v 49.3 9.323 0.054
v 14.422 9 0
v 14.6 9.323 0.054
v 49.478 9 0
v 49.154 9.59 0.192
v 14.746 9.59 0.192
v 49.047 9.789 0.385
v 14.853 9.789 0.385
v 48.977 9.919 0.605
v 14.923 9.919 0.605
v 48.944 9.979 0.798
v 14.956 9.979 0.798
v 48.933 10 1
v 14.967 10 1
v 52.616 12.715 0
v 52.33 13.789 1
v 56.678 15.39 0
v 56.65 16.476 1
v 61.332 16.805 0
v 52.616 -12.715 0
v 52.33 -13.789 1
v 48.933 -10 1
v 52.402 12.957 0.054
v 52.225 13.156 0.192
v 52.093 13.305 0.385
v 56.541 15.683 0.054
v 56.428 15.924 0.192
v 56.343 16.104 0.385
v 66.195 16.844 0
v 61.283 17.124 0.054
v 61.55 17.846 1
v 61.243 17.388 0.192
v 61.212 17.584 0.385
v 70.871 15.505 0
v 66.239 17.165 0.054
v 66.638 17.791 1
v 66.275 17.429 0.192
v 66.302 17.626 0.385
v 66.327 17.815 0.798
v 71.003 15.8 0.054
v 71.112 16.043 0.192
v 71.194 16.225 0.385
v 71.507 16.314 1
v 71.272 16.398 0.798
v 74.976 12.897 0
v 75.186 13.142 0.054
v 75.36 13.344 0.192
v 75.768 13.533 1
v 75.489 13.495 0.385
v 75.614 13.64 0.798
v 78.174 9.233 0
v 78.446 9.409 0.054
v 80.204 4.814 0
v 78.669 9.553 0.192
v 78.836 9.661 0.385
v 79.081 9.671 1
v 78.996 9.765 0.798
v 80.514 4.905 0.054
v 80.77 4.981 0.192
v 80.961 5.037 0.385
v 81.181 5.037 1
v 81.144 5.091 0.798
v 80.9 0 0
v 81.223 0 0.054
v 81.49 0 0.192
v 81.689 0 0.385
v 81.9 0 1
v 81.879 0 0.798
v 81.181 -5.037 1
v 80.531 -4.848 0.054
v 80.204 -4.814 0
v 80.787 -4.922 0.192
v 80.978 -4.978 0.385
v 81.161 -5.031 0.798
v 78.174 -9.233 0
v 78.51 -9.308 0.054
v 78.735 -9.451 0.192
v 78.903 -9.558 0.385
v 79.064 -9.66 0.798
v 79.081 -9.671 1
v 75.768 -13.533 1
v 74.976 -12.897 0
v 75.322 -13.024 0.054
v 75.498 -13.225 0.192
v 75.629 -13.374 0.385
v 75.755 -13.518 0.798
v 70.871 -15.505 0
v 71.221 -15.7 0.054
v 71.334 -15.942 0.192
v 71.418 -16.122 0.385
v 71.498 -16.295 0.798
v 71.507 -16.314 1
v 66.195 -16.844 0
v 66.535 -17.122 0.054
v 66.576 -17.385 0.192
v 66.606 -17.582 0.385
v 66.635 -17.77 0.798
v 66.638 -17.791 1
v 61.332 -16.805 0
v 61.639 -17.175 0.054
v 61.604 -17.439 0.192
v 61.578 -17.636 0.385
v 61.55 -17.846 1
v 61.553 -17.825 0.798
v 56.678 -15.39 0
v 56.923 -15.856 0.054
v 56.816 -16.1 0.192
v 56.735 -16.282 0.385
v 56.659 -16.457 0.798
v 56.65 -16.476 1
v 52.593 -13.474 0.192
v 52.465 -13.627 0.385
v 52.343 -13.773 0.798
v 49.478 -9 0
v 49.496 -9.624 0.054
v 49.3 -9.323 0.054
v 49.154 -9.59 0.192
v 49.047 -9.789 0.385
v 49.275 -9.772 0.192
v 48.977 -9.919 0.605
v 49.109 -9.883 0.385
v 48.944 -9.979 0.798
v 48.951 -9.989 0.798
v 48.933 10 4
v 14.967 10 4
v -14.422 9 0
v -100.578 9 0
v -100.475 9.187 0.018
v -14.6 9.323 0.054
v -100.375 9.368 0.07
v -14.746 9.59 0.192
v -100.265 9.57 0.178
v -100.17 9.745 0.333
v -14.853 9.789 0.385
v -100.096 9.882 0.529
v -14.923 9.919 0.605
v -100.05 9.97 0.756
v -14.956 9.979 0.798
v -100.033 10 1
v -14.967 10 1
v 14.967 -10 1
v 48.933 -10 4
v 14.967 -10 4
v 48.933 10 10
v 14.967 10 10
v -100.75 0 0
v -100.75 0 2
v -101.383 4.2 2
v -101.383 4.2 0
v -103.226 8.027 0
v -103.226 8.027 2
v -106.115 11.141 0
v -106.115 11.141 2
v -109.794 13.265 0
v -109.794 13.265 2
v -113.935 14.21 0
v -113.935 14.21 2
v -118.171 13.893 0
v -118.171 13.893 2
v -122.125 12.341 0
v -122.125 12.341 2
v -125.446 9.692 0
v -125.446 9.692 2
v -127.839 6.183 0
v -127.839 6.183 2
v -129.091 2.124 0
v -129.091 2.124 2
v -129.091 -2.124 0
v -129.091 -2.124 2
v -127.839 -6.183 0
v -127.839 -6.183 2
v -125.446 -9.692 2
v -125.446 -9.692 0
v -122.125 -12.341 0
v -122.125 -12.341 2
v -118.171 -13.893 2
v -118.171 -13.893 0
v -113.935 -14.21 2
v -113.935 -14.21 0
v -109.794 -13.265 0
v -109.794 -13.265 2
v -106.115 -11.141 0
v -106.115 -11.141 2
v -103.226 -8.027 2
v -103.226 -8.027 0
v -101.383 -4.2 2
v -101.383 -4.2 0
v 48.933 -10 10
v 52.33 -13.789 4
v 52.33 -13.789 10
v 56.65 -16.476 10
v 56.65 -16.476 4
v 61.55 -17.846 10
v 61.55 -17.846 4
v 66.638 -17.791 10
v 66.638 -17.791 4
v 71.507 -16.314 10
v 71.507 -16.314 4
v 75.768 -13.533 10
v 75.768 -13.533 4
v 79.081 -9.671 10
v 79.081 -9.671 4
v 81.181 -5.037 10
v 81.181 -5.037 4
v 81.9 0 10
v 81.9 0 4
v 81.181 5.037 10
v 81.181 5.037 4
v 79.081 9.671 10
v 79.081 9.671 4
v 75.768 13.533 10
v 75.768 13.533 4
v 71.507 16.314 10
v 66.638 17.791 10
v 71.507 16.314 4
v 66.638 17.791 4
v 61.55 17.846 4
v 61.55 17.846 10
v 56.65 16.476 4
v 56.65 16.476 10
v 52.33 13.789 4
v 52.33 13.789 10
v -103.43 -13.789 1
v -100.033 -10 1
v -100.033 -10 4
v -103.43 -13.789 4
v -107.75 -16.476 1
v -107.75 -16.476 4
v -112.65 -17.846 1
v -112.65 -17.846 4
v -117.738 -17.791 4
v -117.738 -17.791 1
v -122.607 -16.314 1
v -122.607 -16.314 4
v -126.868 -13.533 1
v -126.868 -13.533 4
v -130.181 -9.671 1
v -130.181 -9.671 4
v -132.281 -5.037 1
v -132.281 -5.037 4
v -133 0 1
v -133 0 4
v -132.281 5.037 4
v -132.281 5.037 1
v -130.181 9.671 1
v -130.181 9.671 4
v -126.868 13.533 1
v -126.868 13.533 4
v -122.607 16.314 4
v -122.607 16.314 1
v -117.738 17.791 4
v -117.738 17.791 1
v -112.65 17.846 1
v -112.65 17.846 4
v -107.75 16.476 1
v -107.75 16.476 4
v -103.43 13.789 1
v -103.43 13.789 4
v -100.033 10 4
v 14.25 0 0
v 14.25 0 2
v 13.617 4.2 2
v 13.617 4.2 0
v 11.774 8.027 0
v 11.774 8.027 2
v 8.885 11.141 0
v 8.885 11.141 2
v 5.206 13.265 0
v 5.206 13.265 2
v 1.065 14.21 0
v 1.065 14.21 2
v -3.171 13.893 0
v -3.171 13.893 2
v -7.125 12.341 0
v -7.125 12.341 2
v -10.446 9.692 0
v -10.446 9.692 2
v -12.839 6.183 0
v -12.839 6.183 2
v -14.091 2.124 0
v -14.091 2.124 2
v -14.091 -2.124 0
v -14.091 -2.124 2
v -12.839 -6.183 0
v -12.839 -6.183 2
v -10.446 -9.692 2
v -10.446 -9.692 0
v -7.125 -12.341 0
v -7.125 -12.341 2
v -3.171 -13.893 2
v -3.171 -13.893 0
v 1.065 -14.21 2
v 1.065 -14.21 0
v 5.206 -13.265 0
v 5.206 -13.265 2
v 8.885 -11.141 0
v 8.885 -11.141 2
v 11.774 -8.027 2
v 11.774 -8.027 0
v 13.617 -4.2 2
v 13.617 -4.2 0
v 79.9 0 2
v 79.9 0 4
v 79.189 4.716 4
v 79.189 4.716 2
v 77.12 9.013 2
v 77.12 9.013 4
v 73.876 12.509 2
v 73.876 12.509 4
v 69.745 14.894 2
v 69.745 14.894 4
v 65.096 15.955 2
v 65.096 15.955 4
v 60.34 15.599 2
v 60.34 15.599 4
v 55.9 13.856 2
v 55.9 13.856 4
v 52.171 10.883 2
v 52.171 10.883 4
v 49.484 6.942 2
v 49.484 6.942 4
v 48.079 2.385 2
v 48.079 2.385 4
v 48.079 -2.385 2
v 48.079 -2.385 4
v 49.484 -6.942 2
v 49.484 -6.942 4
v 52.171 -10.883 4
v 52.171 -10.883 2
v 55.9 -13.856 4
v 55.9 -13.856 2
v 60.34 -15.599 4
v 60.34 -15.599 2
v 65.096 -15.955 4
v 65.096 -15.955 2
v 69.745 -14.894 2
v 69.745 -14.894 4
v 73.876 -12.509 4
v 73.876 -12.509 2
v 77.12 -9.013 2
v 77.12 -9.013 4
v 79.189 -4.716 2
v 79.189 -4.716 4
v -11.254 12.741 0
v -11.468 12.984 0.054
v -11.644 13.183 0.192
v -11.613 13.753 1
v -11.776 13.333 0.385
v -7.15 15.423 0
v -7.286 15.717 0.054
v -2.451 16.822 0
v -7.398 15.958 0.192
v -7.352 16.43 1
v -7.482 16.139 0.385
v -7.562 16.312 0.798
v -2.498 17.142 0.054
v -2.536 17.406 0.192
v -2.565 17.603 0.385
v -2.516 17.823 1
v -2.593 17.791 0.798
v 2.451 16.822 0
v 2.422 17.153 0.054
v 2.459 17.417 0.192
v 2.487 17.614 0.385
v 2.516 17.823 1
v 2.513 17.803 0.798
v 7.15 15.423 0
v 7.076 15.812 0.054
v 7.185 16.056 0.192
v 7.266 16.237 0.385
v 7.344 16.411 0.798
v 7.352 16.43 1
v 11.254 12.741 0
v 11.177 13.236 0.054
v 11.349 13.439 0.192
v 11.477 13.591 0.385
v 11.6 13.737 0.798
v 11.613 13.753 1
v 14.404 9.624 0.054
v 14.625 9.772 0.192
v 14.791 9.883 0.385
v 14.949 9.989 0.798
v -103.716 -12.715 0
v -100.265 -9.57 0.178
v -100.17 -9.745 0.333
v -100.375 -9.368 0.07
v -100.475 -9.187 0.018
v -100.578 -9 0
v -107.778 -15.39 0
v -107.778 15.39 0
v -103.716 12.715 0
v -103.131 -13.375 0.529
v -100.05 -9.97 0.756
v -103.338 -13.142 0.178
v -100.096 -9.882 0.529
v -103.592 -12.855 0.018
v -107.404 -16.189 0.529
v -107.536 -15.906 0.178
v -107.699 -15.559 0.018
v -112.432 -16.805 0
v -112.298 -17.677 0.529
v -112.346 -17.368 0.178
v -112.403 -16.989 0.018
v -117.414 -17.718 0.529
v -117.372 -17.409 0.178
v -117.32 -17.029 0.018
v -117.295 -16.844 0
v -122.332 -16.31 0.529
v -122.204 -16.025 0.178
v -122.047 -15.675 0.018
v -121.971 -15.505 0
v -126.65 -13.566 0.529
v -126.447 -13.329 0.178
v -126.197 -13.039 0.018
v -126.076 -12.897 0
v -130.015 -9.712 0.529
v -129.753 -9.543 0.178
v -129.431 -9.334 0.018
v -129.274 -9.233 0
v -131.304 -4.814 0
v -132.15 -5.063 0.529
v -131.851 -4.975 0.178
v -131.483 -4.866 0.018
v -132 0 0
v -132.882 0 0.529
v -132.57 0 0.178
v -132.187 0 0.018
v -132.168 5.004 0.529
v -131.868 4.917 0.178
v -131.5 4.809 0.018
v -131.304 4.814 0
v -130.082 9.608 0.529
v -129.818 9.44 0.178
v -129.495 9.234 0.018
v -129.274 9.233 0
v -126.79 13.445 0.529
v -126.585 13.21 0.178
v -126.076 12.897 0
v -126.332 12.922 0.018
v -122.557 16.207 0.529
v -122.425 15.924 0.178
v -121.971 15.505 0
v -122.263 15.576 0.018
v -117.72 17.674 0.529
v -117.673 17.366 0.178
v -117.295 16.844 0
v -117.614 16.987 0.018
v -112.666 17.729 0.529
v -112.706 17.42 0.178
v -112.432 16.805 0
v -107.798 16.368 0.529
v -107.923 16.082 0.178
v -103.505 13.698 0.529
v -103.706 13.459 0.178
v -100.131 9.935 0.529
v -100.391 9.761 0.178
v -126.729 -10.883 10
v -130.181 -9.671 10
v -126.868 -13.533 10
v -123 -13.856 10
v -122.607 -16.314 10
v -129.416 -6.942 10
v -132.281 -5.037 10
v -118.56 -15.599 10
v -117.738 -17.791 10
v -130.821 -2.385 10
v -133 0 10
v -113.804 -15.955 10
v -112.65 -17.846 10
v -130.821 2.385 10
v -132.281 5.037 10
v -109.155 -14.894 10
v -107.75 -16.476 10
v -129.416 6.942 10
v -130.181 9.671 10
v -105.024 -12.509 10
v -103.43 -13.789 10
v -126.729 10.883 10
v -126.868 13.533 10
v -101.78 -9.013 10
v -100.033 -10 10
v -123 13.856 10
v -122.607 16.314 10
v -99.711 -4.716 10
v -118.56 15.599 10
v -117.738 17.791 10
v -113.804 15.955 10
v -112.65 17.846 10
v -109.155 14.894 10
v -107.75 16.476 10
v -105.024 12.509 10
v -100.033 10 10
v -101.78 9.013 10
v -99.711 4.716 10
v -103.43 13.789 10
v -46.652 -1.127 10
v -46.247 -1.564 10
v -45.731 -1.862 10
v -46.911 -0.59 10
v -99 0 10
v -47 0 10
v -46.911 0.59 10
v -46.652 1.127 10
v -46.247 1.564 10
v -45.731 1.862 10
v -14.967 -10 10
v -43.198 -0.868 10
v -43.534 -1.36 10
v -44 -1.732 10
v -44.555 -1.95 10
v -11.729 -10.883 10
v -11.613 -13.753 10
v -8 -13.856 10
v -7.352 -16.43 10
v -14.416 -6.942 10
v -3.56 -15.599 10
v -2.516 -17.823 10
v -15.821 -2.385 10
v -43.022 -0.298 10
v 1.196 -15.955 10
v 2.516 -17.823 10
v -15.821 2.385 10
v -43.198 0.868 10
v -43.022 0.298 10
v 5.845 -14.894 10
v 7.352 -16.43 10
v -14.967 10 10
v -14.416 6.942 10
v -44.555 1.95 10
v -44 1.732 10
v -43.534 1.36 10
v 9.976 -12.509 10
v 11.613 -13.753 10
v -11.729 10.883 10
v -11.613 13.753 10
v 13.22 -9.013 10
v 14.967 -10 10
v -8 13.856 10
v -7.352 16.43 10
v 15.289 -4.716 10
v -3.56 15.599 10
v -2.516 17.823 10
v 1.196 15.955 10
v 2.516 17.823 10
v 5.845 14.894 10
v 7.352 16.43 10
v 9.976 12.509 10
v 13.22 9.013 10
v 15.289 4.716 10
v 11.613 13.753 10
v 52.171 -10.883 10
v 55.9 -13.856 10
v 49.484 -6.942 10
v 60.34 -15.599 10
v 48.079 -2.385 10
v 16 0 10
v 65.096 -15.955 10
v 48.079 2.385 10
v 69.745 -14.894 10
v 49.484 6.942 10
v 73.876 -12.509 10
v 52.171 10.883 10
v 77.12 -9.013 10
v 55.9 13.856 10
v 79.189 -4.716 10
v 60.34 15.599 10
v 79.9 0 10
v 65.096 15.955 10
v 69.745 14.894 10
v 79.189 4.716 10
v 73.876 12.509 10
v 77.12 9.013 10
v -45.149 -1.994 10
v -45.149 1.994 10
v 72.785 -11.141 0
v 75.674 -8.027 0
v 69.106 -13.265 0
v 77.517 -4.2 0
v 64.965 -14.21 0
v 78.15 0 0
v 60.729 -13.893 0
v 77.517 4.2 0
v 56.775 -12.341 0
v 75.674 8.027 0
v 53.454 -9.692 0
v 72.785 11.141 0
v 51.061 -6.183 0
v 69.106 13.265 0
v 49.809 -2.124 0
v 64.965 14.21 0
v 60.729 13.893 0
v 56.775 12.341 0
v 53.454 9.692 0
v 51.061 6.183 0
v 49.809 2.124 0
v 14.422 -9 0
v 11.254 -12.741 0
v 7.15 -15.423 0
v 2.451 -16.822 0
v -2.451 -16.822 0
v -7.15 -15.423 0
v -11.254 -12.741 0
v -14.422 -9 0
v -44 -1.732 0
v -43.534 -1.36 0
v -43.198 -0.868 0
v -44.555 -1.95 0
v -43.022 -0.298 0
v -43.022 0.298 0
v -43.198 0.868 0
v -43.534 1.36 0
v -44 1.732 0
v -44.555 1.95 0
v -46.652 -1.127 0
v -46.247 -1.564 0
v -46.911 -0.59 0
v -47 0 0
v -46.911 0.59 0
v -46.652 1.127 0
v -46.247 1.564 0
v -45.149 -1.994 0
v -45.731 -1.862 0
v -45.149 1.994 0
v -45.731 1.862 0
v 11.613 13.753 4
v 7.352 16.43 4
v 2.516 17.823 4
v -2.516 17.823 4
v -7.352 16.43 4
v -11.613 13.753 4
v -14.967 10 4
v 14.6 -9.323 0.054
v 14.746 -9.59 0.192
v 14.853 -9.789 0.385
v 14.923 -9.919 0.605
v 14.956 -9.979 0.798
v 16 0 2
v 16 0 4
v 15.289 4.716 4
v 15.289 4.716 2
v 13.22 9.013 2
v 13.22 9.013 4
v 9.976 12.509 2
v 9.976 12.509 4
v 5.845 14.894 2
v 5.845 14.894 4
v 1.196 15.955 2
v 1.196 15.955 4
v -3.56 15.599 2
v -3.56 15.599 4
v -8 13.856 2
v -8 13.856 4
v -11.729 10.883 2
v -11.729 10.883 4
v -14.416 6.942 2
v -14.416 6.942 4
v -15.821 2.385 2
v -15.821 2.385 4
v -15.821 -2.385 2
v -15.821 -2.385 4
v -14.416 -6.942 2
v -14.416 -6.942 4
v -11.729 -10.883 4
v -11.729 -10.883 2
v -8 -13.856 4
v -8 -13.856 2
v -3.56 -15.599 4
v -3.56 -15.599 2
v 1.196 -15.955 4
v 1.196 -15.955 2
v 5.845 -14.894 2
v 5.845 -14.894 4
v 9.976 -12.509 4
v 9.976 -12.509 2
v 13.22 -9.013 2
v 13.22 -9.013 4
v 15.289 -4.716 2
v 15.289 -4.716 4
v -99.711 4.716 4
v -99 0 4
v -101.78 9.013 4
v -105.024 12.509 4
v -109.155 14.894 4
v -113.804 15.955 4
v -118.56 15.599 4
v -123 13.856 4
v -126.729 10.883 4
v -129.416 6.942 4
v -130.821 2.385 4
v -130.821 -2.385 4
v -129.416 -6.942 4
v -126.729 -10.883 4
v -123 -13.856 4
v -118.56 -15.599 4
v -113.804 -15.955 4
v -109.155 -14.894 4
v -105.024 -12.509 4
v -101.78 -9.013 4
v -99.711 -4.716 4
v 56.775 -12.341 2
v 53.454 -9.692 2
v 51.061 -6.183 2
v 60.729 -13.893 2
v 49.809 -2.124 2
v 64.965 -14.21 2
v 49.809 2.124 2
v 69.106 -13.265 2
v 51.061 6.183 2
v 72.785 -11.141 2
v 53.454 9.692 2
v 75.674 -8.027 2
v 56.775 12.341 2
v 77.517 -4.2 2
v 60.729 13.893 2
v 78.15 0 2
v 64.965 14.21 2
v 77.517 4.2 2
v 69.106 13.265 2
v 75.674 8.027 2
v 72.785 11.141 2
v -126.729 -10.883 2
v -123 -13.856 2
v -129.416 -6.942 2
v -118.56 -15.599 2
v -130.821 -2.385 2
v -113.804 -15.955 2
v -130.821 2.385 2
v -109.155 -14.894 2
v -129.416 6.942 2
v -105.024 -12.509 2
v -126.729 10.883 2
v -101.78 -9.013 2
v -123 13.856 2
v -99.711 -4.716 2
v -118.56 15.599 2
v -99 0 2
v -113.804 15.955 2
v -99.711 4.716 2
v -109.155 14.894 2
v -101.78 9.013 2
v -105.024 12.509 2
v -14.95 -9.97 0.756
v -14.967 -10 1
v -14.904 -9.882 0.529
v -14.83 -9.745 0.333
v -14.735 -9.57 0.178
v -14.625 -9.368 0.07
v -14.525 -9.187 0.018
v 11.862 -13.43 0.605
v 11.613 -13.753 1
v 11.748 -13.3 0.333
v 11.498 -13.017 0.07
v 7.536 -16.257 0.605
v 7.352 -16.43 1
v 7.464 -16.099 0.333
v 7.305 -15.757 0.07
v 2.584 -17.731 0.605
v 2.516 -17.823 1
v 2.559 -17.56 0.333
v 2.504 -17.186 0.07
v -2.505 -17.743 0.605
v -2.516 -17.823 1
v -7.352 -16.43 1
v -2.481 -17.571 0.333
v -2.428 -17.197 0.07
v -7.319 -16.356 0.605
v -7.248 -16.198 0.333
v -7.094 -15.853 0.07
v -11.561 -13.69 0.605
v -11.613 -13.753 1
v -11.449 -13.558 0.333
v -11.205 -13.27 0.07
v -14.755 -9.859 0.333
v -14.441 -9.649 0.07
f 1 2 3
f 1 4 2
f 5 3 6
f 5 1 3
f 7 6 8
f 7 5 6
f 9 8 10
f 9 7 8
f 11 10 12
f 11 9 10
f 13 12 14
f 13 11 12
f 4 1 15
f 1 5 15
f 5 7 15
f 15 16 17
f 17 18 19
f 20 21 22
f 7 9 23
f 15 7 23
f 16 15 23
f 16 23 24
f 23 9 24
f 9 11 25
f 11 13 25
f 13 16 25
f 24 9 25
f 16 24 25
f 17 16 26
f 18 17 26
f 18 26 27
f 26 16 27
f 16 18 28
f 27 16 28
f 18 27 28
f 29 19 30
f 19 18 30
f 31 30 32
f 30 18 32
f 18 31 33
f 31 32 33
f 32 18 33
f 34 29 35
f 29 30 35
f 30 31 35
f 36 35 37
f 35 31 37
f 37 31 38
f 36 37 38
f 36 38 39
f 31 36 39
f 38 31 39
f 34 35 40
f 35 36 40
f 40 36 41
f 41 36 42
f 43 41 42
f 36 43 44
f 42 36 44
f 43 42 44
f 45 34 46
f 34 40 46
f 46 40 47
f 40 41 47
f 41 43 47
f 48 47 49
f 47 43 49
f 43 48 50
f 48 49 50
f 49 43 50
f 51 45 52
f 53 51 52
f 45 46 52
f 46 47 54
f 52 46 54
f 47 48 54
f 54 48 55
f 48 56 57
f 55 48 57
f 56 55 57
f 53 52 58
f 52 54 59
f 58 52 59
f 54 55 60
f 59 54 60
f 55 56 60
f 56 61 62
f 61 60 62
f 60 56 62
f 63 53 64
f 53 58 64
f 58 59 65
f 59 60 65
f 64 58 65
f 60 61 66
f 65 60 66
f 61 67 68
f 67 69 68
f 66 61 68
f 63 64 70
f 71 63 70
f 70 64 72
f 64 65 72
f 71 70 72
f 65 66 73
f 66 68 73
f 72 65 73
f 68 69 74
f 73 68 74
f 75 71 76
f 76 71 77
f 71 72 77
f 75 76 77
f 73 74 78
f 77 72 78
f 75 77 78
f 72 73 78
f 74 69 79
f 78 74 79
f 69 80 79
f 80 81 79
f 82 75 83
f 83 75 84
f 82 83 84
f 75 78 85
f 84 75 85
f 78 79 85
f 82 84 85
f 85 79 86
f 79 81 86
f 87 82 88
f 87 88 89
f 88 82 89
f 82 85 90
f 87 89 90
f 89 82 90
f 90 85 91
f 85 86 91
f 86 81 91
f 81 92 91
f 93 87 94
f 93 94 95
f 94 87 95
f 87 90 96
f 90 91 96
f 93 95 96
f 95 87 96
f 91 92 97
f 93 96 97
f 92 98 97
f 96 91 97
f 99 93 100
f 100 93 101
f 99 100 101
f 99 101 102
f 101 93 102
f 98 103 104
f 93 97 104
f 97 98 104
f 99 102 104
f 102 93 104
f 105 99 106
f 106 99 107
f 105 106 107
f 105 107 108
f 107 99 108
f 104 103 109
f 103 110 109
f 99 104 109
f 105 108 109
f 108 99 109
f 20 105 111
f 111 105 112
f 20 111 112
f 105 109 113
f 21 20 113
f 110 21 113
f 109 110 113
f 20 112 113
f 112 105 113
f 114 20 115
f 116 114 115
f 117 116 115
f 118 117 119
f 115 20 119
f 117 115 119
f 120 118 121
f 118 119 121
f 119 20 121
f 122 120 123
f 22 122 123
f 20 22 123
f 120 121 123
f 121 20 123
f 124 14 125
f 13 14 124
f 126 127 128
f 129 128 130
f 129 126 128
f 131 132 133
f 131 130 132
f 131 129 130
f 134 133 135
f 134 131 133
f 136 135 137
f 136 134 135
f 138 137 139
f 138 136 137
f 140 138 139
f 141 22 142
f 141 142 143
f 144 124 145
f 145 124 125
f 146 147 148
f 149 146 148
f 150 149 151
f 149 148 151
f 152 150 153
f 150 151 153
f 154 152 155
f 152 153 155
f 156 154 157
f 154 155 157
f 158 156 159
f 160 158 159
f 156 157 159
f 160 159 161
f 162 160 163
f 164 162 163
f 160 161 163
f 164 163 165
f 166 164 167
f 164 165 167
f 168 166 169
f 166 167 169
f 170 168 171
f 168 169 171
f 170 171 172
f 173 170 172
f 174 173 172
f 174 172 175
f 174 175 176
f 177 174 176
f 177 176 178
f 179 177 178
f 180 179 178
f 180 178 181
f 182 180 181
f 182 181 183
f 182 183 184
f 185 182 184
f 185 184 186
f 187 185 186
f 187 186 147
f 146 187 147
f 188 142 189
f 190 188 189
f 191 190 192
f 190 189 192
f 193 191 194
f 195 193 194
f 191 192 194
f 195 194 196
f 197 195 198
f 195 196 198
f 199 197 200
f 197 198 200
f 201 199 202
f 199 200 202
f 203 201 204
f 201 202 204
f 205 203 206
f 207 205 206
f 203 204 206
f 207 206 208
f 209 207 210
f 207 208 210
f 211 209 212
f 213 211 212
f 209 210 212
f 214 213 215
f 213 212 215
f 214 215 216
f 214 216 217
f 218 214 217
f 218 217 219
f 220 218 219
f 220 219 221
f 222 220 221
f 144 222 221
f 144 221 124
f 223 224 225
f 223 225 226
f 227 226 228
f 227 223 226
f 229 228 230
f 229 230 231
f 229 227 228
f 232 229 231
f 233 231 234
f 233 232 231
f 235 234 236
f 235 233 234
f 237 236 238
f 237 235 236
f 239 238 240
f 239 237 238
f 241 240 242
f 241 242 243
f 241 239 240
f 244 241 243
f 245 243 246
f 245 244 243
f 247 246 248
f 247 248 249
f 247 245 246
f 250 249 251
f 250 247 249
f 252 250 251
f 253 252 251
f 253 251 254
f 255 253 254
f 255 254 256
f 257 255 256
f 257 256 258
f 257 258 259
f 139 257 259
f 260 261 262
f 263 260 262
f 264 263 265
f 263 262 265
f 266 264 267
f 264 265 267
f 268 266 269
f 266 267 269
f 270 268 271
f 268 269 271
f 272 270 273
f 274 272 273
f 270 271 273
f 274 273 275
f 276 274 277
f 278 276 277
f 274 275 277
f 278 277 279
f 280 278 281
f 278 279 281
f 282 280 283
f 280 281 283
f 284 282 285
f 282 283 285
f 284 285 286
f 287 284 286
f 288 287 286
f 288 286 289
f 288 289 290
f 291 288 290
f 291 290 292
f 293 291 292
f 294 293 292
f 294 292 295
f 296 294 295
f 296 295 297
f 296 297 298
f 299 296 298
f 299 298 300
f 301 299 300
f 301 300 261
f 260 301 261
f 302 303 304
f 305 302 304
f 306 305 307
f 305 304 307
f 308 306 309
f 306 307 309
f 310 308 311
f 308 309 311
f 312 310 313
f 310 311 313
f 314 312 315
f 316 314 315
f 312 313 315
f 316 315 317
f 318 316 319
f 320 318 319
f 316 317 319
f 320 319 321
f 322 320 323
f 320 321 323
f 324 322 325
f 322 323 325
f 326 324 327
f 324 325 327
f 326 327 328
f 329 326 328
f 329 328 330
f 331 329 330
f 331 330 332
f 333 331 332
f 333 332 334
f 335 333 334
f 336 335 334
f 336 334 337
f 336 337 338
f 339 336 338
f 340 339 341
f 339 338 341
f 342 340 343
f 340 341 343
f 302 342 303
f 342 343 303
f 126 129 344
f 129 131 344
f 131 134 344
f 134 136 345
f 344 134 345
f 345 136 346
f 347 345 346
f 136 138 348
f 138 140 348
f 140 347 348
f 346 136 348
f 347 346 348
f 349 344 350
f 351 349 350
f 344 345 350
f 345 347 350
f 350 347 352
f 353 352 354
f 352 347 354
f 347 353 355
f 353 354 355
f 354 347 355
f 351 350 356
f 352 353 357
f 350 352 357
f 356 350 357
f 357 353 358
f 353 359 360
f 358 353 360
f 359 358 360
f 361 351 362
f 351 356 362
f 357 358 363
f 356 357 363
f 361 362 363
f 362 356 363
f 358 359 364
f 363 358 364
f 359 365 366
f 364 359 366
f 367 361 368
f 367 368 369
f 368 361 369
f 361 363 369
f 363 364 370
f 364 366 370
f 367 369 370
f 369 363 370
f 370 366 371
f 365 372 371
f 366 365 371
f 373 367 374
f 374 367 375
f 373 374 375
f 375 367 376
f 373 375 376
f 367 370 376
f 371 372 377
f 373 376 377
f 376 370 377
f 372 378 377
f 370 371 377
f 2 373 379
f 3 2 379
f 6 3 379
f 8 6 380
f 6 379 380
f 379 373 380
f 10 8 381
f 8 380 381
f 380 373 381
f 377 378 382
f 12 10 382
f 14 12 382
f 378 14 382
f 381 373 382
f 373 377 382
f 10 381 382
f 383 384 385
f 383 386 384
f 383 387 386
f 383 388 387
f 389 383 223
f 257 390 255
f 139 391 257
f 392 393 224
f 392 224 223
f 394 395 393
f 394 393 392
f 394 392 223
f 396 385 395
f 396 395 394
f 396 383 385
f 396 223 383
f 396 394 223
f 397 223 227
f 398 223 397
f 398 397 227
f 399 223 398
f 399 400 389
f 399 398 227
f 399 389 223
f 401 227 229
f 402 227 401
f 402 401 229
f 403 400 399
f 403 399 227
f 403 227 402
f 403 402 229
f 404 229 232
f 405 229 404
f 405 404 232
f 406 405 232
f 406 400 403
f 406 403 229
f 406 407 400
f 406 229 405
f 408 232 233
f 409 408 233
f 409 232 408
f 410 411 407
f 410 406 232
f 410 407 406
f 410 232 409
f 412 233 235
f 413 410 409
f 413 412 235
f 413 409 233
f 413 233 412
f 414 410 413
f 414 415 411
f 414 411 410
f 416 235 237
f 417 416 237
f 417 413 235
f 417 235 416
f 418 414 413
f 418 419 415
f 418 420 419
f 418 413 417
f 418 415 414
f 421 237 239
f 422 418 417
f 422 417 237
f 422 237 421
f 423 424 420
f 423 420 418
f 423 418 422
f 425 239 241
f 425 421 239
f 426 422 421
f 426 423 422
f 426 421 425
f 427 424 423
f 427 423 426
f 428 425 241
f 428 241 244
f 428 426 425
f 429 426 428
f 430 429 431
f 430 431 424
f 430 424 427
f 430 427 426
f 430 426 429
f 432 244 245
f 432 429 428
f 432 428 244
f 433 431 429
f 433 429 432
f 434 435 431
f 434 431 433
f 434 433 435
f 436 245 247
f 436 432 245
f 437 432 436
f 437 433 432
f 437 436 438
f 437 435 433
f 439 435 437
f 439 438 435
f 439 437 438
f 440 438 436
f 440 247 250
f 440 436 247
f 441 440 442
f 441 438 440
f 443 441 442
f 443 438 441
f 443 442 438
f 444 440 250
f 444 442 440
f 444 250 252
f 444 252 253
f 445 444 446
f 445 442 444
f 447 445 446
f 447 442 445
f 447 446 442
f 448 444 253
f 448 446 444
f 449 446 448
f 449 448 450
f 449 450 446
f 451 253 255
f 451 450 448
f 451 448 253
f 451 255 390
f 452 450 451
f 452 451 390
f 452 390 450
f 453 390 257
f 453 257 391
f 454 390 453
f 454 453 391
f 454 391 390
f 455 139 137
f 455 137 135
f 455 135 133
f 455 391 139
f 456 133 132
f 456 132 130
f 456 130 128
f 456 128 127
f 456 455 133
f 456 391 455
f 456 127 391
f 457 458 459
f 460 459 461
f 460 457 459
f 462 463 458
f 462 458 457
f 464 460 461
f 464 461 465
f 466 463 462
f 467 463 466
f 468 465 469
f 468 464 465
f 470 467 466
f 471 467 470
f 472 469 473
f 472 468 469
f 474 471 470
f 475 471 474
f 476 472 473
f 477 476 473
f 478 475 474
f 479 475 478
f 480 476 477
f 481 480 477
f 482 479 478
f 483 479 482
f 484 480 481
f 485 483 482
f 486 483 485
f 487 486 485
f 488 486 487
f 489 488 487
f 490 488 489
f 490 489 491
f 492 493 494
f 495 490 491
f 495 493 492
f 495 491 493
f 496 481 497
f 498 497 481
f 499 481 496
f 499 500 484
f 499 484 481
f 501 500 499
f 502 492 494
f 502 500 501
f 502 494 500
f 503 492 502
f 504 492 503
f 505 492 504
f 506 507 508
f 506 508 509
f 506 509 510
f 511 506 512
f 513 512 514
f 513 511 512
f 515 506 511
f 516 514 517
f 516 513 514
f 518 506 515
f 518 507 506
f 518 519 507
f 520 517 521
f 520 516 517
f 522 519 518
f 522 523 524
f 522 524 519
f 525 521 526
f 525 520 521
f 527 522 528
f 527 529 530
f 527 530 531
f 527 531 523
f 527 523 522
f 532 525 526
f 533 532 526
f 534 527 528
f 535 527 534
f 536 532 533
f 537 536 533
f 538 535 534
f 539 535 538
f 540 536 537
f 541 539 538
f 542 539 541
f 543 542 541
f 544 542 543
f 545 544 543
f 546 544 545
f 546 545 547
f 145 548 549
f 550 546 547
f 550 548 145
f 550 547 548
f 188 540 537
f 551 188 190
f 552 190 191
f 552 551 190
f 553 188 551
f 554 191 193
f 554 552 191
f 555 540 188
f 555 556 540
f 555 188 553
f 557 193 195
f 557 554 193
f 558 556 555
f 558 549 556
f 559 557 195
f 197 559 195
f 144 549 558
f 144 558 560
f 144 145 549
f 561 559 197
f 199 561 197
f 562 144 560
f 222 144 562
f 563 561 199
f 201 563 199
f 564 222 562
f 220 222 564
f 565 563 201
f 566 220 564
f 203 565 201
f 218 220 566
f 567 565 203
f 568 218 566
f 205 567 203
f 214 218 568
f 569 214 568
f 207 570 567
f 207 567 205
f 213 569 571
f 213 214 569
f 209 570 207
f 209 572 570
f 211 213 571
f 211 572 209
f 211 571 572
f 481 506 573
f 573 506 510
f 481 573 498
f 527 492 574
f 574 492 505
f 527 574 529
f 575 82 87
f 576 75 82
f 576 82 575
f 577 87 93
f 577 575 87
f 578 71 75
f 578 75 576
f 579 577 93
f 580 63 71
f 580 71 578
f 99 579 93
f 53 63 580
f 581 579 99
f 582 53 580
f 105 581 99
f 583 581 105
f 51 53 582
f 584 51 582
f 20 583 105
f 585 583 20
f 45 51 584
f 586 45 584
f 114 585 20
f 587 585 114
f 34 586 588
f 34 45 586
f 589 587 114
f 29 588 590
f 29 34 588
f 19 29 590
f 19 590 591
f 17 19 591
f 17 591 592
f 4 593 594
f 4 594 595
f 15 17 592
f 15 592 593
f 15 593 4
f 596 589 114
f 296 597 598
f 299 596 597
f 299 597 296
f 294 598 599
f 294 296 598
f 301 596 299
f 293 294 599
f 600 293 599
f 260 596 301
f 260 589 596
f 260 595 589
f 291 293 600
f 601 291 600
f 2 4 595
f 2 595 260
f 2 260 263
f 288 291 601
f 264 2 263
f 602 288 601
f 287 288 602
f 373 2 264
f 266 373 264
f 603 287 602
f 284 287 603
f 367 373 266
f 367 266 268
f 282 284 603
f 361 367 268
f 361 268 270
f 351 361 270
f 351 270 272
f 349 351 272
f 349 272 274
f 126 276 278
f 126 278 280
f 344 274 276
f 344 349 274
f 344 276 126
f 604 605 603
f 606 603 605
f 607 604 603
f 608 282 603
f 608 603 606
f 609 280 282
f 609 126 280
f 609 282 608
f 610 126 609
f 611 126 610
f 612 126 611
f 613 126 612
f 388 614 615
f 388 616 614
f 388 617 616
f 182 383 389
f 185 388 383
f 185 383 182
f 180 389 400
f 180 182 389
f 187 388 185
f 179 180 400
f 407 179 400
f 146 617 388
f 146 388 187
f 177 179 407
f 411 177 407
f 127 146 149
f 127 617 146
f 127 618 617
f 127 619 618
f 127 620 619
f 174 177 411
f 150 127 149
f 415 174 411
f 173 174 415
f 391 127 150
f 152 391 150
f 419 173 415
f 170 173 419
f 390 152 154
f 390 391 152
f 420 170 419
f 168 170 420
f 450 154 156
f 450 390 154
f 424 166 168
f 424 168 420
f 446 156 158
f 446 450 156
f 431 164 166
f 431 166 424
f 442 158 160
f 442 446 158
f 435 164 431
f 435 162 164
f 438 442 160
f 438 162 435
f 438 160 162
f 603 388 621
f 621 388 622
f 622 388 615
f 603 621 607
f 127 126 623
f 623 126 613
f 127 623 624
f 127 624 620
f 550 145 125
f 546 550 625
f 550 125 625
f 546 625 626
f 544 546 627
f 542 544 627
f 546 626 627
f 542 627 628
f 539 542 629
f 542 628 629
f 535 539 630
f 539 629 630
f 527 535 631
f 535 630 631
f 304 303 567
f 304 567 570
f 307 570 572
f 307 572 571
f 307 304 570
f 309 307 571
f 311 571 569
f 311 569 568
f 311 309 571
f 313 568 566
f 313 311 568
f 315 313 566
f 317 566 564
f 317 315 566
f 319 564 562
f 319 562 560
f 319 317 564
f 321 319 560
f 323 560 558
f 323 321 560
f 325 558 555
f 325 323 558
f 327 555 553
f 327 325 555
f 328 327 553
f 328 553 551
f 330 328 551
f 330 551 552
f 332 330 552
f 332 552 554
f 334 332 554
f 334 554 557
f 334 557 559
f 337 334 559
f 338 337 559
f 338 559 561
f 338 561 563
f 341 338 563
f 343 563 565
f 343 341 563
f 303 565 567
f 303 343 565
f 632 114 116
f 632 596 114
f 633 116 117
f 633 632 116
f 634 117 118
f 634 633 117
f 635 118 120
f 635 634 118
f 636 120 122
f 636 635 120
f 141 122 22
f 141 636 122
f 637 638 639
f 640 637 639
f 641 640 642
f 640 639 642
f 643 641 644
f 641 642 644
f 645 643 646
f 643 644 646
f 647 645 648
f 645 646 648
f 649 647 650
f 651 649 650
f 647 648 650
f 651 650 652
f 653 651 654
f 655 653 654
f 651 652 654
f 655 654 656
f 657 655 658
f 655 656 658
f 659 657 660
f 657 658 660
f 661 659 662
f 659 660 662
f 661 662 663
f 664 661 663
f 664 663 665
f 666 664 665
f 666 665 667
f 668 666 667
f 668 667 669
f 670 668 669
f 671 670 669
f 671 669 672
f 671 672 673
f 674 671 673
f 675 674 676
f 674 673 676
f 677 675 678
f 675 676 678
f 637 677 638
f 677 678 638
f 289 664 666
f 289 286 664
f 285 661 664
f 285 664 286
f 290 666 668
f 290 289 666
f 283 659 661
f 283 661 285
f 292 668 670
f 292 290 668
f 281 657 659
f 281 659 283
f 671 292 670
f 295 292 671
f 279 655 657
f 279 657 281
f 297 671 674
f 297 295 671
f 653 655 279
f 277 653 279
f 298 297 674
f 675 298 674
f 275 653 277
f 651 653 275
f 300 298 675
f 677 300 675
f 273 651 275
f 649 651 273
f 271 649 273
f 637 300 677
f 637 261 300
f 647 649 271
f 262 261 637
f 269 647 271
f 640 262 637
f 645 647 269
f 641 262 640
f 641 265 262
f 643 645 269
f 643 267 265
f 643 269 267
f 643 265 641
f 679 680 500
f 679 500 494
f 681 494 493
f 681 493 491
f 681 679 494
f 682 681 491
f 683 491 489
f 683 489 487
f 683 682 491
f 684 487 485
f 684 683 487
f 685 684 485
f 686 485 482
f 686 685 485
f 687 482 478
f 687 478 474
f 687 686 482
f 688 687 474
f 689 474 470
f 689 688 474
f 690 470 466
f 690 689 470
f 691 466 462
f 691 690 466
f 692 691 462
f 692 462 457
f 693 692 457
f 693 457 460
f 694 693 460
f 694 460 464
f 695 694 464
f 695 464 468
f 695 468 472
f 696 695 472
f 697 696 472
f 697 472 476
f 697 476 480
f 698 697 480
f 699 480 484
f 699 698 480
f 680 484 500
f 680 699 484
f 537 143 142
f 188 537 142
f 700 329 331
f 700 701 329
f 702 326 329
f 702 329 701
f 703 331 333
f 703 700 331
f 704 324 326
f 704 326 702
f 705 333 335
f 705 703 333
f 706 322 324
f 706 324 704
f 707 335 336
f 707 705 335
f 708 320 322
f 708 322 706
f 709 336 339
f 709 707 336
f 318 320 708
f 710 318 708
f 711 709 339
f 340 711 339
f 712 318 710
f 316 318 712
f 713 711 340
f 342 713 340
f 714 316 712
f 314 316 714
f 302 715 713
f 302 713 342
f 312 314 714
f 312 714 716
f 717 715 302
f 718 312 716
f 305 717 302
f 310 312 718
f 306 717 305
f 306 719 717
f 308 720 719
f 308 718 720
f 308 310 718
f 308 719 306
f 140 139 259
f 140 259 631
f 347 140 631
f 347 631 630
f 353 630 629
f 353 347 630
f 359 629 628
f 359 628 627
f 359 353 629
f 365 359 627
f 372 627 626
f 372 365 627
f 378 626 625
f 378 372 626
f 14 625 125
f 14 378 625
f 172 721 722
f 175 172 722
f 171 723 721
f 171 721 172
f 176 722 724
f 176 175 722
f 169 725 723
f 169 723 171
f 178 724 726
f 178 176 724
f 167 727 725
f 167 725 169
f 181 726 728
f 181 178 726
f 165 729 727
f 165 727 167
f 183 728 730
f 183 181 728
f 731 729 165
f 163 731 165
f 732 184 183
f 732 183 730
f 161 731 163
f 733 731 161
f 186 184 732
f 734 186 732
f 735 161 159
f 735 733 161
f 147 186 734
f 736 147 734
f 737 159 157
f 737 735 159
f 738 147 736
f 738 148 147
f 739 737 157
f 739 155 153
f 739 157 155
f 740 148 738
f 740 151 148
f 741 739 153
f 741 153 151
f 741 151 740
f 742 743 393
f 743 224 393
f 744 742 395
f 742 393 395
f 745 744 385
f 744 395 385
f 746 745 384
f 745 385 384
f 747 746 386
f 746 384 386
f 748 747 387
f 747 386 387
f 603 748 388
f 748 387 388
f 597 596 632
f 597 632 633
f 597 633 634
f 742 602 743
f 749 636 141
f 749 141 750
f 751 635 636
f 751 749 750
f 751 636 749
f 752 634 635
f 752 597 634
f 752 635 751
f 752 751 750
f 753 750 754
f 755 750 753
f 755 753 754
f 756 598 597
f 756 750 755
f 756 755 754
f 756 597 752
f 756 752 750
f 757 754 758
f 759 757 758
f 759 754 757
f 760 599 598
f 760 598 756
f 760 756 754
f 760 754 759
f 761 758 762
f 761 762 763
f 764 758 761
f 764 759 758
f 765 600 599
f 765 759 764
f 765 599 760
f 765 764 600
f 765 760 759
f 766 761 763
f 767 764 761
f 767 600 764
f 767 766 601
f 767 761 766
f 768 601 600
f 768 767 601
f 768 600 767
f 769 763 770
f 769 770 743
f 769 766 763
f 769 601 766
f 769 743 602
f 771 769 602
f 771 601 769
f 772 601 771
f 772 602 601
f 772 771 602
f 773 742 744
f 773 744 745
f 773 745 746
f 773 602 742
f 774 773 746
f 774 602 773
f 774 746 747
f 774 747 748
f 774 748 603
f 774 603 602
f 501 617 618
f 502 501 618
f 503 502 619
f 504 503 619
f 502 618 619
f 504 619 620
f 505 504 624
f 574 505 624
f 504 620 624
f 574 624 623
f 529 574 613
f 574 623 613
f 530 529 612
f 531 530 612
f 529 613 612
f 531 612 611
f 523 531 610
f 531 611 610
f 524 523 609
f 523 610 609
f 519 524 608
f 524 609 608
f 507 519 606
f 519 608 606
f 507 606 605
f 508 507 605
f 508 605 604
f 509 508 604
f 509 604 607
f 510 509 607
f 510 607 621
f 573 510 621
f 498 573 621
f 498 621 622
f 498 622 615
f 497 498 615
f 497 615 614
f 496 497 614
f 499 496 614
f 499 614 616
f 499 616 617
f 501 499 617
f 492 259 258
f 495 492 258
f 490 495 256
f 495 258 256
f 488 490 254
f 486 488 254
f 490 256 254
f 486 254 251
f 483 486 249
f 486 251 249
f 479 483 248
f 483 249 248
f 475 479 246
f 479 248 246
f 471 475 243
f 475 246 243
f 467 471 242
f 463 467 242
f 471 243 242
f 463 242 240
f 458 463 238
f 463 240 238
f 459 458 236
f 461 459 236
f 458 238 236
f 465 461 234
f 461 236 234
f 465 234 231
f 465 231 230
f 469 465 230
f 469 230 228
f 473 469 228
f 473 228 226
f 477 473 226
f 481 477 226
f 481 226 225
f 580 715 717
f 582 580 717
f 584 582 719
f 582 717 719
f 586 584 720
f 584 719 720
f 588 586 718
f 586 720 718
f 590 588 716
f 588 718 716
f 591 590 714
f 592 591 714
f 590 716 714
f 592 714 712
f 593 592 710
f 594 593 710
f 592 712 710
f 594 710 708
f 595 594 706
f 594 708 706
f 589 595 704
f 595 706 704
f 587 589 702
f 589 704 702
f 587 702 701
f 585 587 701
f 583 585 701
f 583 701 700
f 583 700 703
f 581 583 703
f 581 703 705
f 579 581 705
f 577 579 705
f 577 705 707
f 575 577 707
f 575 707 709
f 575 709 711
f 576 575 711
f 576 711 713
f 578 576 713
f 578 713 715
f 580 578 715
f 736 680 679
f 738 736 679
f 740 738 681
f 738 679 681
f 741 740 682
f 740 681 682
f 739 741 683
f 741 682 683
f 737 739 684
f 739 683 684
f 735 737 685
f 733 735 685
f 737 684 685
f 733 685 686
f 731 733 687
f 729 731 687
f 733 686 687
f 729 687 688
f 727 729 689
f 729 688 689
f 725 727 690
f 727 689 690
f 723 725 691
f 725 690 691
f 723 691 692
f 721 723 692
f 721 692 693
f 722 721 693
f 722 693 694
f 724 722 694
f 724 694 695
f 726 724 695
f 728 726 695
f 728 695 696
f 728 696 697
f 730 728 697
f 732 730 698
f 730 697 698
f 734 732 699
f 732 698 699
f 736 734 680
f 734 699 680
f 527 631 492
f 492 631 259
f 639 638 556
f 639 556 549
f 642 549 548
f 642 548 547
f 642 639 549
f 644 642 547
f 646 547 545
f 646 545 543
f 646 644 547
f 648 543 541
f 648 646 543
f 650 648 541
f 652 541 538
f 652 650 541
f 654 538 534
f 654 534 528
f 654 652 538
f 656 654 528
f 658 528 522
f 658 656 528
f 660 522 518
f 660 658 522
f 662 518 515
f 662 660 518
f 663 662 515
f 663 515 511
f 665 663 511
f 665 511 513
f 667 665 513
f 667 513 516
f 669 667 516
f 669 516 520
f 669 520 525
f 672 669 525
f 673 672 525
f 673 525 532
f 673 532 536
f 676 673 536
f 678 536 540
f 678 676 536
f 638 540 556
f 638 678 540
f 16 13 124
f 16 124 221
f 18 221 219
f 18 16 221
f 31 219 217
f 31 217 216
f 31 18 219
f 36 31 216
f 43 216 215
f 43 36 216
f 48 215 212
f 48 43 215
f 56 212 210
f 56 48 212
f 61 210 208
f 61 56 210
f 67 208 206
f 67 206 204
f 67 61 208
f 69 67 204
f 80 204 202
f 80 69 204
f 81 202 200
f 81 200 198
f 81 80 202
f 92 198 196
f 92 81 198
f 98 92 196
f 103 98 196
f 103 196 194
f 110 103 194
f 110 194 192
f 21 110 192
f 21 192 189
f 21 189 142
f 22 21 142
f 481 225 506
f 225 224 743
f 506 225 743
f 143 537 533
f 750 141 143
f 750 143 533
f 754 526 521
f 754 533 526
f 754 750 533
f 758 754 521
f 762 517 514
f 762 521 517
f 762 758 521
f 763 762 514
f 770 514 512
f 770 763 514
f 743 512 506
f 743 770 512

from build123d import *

# Parameters (mm, degrees)
BOSS_EXTRU_1_DEPTH      = 4
ESQUISSE6_R             = 16
ENL_V_MAT_EXTRU_1_DEPTH = 2
ESQUISSE7_R             = 14.25
ENL_V_MAT_EXTRU_2_DEPTH = 135.227418958
ESQUISSE10_R            = 16
BOSS_EXTRU_5_DEPTH      = 6
CONG_1_R                = 1
ESQUISSE12_R            = 2
ENL_V_MAT_EXTRU_3_DEPTH = 135.58454603


with BuildPart() as part:
    # Esquisse1 → Boss.-Extru.1 (new body)
    with BuildSketch(Plane.XY):
        with BuildLine():
            Line((-100.033370453, 10), (-14.966629547, 10))
            ThreePointArc((-14.966629547, 10), (0, 18), (14.966629547, 10))
            Line((14.966629547, 10), (48.933370453, 10))
            ThreePointArc((48.933370453, 10), (81.9, 0), (48.933370453, -10))
            Line((48.933370453, -10), (14.966629547, -10))
            ThreePointArc((14.966629547, -10), (0, -18), (-14.966629547, -10))
            Line((-14.966629547, -10), (-100.033370453, -10))
            ThreePointArc((-100.033370453, -10), (-133, 0), (-100.033370453, 10))
        make_face()
    extrude(amount=BOSS_EXTRU_1_DEPTH)

    # Esquisse6 → Enlèv. mat.-Extru.1 (cut)
    with BuildSketch(Plane.XY.offset(4)):
        with Locations((-115, 0)):
            Circle(ESQUISSE6_R)
        Circle(ESQUISSE6_R)
        with Locations((63.9, 0)):
            Circle(ESQUISSE6_R)
    extrude(amount=-ENL_V_MAT_EXTRU_1_DEPTH, mode=Mode.SUBTRACT)

    # Esquisse7 → Enlèv. mat.-Extru.2 (cut, through all)
    with BuildSketch(Plane.XY.offset(2)):
        with Locations((-115, 0)):
            Circle(ESQUISSE7_R)
        Circle(ESQUISSE7_R)
        with Locations((63.9, 0)):
            Circle(ESQUISSE7_R)
    extrude(amount=-ENL_V_MAT_EXTRU_2_DEPTH, mode=Mode.SUBTRACT)

    # Esquisse10 → Boss.-Extru.5 (add)
    with BuildSketch(Plane.XY.offset(4)):
        with BuildLine():
            Line((-100.033370453, -10), (-14.966629547, -10))
            ThreePointArc((-14.966629547, -10), (0, -18), (14.966629547, -10))
            Line((14.966629547, -10), (48.933370453, -10))
            ThreePointArc((48.933370453, -10), (81.9, 0), (48.933370453, 10))
            Line((48.933370453, 10), (14.966629547, 10))
            ThreePointArc((14.966629547, 10), (0, 18), (-14.966629547, 10))
            Line((-14.966629547, 10), (-100.033370453, 10))
            ThreePointArc((-100.033370453, 10), (-133, 0), (-100.033370453, -10))
        make_face()
        with Locations((63.9, 0)):
            Circle(ESQUISSE10_R, mode=Mode.SUBTRACT)
        Circle(ESQUISSE10_R, mode=Mode.SUBTRACT)
        with Locations((-115, 0)):
            Circle(ESQUISSE10_R, mode=Mode.SUBTRACT)
    extrude(amount=BOSS_EXTRU_5_DEPTH)

    # Congé1
    cong_1_edges = [part.edges().sort_by_distance(p)[0] for p in [
        (31.95, -10, 0),
        (0, -18, 0),
        (-57.5, -10, 0),
        (-133, 0, 0),
        (-57.5, 10, 0),
        (0, 18, 0),
        (31.95, 10, 0),
        (81.9, 0, 0),
    ]]
    fillet(cong_1_edges, radius=CONG_1_R)

    # Esquisse12 → Enlèv. mat.-Extru.3 (cut, through all)
    with BuildSketch(Plane(origin=(0, 0, 0), x_dir=(-1, 0, 0), z_dir=(0, 0, -1))):
        with Locations((45, 0)):
            Circle(ESQUISSE12_R)
    extrude(amount=-ENL_V_MAT_EXTRU_3_DEPTH, mode=Mode.SUBTRACT)


solid = part.part
